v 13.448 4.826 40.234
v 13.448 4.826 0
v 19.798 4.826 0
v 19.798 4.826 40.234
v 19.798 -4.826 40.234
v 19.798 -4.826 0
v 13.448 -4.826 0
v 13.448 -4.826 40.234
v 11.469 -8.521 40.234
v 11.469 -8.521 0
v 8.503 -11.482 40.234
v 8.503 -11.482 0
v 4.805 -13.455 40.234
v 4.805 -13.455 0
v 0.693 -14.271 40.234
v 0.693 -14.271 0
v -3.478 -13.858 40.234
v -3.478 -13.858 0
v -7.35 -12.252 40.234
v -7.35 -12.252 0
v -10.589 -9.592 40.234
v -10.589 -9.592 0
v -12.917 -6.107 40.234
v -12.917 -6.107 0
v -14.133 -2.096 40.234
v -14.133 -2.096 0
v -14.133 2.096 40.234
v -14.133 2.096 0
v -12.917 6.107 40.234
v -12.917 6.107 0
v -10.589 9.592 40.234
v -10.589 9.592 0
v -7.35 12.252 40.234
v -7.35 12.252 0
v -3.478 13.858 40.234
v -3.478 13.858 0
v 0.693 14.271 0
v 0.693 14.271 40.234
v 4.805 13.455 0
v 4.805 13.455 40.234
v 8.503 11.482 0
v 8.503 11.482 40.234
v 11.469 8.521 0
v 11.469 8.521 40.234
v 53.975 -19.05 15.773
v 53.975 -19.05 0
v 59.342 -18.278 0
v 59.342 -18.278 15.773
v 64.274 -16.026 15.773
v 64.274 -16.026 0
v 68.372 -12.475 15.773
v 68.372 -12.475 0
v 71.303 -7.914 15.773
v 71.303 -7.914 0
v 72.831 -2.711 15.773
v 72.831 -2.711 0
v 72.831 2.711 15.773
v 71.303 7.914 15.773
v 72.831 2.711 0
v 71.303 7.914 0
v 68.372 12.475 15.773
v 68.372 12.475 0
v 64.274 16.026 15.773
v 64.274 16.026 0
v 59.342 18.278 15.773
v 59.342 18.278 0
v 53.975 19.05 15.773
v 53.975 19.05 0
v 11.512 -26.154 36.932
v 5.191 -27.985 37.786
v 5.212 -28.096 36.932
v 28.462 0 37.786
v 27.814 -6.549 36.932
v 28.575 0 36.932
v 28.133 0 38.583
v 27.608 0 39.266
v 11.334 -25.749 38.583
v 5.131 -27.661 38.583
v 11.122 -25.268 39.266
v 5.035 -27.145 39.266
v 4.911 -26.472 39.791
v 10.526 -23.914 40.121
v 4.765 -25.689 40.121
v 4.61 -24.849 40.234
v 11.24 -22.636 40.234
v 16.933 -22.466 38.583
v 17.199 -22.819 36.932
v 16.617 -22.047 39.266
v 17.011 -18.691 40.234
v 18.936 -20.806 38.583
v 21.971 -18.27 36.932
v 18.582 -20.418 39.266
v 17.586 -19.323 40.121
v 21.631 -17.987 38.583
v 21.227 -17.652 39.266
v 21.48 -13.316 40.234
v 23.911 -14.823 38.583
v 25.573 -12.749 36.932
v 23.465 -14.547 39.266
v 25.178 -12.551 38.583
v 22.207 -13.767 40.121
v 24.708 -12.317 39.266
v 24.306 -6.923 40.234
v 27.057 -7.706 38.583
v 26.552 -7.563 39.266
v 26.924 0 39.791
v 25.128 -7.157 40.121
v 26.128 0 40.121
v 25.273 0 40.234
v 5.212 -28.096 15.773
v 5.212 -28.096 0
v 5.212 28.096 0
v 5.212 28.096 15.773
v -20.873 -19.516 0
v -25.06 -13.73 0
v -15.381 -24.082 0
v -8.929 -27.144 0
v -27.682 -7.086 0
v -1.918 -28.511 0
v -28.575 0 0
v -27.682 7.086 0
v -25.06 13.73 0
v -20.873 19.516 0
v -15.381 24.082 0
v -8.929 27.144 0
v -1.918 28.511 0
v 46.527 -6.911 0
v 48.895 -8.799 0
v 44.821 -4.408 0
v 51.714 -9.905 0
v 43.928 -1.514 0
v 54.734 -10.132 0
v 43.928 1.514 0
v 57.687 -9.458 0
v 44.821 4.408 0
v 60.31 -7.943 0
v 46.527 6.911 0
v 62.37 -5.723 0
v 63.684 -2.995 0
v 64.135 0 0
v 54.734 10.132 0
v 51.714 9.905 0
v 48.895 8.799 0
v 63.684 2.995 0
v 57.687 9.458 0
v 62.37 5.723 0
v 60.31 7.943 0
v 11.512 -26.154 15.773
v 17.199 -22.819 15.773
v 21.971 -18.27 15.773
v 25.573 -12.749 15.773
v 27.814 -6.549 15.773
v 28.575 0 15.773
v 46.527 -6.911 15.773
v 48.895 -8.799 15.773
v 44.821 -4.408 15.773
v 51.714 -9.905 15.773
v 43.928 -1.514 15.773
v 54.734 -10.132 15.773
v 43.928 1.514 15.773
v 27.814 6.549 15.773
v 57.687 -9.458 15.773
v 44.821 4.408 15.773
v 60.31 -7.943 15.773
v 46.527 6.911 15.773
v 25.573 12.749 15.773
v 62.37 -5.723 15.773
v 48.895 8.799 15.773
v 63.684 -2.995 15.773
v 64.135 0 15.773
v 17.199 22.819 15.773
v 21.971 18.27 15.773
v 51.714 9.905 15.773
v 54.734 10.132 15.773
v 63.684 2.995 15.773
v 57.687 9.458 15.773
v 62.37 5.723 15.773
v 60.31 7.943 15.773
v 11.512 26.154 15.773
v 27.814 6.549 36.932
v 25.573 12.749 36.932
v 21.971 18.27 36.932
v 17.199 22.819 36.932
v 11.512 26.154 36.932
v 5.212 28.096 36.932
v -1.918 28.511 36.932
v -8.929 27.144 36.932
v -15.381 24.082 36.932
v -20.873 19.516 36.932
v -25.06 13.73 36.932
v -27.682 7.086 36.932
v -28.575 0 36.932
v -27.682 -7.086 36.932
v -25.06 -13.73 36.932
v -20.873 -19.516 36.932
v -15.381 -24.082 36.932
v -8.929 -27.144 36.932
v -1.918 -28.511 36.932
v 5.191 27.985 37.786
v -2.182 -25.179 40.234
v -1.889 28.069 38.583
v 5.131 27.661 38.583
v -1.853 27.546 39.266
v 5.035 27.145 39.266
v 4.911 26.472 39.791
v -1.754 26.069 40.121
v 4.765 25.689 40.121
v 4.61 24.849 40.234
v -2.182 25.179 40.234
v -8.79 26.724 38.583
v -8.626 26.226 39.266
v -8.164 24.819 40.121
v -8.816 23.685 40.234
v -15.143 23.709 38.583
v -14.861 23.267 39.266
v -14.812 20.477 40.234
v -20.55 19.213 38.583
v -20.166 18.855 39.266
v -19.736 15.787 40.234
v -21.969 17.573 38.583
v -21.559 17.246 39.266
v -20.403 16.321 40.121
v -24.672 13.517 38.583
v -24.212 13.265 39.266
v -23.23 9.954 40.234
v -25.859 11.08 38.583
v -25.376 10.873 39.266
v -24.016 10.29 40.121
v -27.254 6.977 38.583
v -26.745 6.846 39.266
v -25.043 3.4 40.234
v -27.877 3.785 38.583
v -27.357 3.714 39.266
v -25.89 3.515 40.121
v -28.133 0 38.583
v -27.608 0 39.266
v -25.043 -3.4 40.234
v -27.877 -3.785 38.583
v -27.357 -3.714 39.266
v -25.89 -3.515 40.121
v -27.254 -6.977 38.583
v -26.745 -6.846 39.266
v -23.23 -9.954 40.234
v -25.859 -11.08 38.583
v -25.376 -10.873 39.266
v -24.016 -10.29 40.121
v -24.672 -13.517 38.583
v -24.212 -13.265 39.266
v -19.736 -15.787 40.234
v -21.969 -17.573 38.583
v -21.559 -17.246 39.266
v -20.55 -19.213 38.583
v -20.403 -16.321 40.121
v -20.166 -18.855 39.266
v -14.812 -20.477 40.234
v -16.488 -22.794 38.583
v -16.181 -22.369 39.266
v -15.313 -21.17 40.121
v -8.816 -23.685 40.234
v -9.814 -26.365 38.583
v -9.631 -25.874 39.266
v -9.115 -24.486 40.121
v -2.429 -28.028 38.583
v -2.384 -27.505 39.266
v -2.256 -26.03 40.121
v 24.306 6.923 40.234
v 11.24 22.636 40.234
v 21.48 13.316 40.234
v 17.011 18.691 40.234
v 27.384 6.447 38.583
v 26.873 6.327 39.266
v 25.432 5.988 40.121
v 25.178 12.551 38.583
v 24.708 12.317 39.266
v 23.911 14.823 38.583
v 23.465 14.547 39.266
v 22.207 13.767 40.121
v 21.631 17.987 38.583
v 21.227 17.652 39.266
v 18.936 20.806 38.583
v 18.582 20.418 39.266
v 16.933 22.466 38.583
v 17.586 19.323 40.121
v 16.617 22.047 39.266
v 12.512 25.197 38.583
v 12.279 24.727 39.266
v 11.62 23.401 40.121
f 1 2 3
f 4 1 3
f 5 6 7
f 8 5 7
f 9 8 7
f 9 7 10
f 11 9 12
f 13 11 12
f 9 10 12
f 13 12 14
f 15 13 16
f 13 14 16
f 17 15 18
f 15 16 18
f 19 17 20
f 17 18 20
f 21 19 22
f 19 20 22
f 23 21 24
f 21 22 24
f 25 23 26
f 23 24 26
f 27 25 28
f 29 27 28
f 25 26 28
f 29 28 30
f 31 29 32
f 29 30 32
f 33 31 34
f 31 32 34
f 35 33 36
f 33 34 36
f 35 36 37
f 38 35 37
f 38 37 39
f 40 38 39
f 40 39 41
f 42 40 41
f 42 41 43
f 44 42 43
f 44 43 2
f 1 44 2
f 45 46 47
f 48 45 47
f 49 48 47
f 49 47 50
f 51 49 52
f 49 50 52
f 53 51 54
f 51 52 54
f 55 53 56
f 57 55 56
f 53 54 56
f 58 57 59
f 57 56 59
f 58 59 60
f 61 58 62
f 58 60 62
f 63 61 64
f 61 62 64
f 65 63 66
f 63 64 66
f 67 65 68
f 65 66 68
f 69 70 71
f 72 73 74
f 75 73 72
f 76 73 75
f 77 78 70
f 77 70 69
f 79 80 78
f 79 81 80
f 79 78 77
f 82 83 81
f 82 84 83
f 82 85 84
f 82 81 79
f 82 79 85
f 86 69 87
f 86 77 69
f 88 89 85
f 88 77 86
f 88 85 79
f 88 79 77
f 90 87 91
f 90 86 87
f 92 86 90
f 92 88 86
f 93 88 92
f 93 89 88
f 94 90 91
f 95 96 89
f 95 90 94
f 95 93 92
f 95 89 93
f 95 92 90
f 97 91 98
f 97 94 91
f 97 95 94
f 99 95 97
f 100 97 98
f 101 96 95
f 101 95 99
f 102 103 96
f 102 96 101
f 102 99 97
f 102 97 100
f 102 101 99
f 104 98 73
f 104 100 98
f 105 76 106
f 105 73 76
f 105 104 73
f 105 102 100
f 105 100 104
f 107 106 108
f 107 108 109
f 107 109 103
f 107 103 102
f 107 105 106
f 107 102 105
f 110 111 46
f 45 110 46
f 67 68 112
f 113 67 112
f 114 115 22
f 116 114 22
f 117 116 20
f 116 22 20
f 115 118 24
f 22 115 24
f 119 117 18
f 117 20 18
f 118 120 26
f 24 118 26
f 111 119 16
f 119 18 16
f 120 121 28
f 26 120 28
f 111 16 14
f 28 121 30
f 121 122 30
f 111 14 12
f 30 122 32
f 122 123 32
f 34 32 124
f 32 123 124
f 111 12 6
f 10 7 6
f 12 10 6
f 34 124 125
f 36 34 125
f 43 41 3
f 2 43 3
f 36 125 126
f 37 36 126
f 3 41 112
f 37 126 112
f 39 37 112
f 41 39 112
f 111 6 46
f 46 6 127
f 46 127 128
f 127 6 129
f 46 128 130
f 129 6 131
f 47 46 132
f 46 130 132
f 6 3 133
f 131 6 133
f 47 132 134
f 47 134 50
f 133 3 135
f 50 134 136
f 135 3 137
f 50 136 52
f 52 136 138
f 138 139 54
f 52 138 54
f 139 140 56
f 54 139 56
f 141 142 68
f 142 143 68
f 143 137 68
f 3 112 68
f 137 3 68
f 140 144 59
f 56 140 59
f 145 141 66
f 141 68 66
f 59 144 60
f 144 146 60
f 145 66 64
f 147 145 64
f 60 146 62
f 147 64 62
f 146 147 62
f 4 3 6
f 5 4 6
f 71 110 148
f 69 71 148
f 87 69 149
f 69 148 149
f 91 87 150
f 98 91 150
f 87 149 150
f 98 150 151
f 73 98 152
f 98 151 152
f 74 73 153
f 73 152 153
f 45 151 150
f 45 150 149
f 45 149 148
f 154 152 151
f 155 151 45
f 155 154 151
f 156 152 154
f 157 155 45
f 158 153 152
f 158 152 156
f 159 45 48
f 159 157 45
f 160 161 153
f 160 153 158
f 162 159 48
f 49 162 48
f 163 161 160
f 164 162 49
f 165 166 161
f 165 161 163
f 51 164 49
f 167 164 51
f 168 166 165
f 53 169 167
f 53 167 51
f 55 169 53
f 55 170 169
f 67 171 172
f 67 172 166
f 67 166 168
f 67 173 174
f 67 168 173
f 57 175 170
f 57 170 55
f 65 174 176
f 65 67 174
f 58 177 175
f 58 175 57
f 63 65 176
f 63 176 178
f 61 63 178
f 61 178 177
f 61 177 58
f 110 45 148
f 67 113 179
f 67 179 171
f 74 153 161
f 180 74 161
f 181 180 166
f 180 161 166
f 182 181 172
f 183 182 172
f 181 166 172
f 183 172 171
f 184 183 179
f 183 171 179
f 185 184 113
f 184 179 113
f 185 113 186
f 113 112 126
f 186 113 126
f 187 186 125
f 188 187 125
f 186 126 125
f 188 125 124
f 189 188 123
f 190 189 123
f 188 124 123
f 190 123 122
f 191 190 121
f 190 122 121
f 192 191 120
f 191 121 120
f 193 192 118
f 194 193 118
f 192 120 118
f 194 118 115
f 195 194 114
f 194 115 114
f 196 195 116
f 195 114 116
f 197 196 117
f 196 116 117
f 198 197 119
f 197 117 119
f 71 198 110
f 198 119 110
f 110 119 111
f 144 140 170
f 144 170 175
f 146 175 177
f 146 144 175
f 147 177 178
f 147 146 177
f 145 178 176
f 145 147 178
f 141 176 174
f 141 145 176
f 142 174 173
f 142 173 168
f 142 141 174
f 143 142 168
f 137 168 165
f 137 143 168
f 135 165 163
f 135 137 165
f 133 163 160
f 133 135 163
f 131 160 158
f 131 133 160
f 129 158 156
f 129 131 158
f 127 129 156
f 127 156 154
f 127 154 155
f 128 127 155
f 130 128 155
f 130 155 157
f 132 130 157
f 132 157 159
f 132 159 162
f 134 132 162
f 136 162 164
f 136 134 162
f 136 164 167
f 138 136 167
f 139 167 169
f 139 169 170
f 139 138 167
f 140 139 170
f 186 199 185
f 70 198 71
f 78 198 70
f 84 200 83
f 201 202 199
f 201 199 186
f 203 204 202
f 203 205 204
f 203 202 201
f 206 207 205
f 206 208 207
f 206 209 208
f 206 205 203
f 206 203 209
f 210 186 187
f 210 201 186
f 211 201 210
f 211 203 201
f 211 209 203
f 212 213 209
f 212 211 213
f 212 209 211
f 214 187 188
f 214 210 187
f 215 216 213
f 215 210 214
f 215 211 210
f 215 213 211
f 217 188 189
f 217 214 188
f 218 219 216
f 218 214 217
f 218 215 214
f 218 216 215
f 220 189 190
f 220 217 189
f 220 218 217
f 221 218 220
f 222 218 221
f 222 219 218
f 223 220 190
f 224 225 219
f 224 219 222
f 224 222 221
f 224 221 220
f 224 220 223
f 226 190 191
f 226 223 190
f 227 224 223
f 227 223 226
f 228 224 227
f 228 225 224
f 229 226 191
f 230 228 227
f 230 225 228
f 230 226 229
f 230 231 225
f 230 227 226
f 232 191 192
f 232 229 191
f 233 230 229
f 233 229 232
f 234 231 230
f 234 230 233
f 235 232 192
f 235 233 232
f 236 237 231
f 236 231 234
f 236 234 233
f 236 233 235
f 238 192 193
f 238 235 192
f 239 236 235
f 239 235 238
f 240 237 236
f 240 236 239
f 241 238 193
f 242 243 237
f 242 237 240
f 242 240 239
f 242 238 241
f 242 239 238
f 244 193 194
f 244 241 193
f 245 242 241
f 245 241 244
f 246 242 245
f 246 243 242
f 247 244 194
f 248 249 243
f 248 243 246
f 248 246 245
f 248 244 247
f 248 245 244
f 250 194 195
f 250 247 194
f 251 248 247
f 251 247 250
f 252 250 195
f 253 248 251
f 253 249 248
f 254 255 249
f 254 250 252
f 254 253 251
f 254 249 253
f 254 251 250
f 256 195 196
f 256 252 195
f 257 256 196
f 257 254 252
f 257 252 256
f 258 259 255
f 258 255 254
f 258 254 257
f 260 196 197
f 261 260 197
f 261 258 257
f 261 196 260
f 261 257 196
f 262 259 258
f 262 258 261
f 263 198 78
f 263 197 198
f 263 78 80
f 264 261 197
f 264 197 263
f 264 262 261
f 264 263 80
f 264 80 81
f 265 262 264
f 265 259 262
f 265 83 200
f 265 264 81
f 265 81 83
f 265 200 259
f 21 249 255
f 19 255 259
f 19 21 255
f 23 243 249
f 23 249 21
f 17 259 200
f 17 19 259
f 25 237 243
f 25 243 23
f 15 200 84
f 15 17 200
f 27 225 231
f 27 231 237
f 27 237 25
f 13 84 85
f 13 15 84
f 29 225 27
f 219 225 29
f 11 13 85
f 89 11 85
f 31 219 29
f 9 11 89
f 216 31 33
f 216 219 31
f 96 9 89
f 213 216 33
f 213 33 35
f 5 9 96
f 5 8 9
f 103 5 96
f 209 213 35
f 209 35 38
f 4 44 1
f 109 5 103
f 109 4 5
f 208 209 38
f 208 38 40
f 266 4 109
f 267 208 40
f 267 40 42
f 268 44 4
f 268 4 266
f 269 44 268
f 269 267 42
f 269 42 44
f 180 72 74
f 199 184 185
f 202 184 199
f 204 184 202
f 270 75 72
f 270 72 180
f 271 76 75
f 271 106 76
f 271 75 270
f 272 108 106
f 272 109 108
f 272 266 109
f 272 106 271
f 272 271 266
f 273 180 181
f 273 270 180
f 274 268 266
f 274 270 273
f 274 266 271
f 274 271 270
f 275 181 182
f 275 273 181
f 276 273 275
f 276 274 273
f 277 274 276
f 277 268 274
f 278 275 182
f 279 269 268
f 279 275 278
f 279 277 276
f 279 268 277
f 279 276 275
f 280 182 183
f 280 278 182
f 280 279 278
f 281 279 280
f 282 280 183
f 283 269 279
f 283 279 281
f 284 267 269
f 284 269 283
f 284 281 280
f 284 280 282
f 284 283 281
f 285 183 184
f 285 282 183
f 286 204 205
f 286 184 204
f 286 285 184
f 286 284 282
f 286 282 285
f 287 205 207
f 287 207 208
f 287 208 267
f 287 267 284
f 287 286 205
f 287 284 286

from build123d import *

# Parameters (mm, degrees)
F1_DEPTH = 40.2336
F0_R     = 10.16
F2_DEPTH = 15.7734
F3_R     = 3.302


# Not quite as in the source:
# - a feature names something its author has since deleted; it is built from what else it names


with BuildPart() as f1:
    # F0 (on Top) → F1 (new body)
    with BuildSketch(Plane.XY):
        with BuildLine():
            ThreePointArc((5.2118165727, -28.0956863773), (21.9710978739, -18.2702348977), (28.575, 0))
            ThreePointArc((28.575, 0), (21.9710978739, 18.2702348977), (5.2118165727, 28.0956863773))
            ThreePointArc((5.2118165727, 28.0956863773), (-28.575, 0), (5.2118165727, -28.0956863773))
        make_face()
        with BuildLine():
            ThreePointArc((13.4477648793, -4.826), (-14.2875, 0), (13.4477648793, 4.826))
            Line((13.4477648793, 4.826), (19.7977648793, 4.826))
            Line((19.7977648793, 4.826), (19.7977648793, -4.826))
            Line((19.7977648793, -4.826), (13.4477648793, -4.826))
        make_face(mode=Mode.SUBTRACT)
    extrude(amount=F1_DEPTH)

    # F0 (on Top) → F2 (join)
    with BuildSketch(Plane.XY):
        with BuildLine():
            ThreePointArc((5.2118165727, 28.0956863773), (21.9710978739, 18.2702348977), (28.575, 0))
            ThreePointArc((28.575, 0), (21.9710978739, -18.2702348977), (5.2118165727, -28.0956863773))
            Line((5.2118165727, -28.0956863773), (53.975, -19.05))
            ThreePointArc((53.975, -19.05), (34.925, 0), (53.975, 19.05))
            Line((53.975, 19.05), (5.2118165727, 28.0956863773))
        make_face()
        with BuildLine():
            ThreePointArc((73.025, 0), (67.4453841816, 13.4703841816), (53.975, 19.05))
            ThreePointArc((53.975, 19.05), (34.925, 0), (53.975, -19.05))
            ThreePointArc((53.975, -19.05), (67.4453841816, -13.4703841816), (73.025, 0))
        make_face()
        with Locations((53.975, 0)):
            Circle(F0_R, mode=Mode.SUBTRACT)
    extrude(amount=F2_DEPTH)

    # F3
    f3_edges = [f1.edges().sort_by_distance(p)[0] for p in [
        (-5.211817, 28.095686, 40.2336),
    ]]
    fillet(f3_edges, radius=F3_R)


solid = f1.part
